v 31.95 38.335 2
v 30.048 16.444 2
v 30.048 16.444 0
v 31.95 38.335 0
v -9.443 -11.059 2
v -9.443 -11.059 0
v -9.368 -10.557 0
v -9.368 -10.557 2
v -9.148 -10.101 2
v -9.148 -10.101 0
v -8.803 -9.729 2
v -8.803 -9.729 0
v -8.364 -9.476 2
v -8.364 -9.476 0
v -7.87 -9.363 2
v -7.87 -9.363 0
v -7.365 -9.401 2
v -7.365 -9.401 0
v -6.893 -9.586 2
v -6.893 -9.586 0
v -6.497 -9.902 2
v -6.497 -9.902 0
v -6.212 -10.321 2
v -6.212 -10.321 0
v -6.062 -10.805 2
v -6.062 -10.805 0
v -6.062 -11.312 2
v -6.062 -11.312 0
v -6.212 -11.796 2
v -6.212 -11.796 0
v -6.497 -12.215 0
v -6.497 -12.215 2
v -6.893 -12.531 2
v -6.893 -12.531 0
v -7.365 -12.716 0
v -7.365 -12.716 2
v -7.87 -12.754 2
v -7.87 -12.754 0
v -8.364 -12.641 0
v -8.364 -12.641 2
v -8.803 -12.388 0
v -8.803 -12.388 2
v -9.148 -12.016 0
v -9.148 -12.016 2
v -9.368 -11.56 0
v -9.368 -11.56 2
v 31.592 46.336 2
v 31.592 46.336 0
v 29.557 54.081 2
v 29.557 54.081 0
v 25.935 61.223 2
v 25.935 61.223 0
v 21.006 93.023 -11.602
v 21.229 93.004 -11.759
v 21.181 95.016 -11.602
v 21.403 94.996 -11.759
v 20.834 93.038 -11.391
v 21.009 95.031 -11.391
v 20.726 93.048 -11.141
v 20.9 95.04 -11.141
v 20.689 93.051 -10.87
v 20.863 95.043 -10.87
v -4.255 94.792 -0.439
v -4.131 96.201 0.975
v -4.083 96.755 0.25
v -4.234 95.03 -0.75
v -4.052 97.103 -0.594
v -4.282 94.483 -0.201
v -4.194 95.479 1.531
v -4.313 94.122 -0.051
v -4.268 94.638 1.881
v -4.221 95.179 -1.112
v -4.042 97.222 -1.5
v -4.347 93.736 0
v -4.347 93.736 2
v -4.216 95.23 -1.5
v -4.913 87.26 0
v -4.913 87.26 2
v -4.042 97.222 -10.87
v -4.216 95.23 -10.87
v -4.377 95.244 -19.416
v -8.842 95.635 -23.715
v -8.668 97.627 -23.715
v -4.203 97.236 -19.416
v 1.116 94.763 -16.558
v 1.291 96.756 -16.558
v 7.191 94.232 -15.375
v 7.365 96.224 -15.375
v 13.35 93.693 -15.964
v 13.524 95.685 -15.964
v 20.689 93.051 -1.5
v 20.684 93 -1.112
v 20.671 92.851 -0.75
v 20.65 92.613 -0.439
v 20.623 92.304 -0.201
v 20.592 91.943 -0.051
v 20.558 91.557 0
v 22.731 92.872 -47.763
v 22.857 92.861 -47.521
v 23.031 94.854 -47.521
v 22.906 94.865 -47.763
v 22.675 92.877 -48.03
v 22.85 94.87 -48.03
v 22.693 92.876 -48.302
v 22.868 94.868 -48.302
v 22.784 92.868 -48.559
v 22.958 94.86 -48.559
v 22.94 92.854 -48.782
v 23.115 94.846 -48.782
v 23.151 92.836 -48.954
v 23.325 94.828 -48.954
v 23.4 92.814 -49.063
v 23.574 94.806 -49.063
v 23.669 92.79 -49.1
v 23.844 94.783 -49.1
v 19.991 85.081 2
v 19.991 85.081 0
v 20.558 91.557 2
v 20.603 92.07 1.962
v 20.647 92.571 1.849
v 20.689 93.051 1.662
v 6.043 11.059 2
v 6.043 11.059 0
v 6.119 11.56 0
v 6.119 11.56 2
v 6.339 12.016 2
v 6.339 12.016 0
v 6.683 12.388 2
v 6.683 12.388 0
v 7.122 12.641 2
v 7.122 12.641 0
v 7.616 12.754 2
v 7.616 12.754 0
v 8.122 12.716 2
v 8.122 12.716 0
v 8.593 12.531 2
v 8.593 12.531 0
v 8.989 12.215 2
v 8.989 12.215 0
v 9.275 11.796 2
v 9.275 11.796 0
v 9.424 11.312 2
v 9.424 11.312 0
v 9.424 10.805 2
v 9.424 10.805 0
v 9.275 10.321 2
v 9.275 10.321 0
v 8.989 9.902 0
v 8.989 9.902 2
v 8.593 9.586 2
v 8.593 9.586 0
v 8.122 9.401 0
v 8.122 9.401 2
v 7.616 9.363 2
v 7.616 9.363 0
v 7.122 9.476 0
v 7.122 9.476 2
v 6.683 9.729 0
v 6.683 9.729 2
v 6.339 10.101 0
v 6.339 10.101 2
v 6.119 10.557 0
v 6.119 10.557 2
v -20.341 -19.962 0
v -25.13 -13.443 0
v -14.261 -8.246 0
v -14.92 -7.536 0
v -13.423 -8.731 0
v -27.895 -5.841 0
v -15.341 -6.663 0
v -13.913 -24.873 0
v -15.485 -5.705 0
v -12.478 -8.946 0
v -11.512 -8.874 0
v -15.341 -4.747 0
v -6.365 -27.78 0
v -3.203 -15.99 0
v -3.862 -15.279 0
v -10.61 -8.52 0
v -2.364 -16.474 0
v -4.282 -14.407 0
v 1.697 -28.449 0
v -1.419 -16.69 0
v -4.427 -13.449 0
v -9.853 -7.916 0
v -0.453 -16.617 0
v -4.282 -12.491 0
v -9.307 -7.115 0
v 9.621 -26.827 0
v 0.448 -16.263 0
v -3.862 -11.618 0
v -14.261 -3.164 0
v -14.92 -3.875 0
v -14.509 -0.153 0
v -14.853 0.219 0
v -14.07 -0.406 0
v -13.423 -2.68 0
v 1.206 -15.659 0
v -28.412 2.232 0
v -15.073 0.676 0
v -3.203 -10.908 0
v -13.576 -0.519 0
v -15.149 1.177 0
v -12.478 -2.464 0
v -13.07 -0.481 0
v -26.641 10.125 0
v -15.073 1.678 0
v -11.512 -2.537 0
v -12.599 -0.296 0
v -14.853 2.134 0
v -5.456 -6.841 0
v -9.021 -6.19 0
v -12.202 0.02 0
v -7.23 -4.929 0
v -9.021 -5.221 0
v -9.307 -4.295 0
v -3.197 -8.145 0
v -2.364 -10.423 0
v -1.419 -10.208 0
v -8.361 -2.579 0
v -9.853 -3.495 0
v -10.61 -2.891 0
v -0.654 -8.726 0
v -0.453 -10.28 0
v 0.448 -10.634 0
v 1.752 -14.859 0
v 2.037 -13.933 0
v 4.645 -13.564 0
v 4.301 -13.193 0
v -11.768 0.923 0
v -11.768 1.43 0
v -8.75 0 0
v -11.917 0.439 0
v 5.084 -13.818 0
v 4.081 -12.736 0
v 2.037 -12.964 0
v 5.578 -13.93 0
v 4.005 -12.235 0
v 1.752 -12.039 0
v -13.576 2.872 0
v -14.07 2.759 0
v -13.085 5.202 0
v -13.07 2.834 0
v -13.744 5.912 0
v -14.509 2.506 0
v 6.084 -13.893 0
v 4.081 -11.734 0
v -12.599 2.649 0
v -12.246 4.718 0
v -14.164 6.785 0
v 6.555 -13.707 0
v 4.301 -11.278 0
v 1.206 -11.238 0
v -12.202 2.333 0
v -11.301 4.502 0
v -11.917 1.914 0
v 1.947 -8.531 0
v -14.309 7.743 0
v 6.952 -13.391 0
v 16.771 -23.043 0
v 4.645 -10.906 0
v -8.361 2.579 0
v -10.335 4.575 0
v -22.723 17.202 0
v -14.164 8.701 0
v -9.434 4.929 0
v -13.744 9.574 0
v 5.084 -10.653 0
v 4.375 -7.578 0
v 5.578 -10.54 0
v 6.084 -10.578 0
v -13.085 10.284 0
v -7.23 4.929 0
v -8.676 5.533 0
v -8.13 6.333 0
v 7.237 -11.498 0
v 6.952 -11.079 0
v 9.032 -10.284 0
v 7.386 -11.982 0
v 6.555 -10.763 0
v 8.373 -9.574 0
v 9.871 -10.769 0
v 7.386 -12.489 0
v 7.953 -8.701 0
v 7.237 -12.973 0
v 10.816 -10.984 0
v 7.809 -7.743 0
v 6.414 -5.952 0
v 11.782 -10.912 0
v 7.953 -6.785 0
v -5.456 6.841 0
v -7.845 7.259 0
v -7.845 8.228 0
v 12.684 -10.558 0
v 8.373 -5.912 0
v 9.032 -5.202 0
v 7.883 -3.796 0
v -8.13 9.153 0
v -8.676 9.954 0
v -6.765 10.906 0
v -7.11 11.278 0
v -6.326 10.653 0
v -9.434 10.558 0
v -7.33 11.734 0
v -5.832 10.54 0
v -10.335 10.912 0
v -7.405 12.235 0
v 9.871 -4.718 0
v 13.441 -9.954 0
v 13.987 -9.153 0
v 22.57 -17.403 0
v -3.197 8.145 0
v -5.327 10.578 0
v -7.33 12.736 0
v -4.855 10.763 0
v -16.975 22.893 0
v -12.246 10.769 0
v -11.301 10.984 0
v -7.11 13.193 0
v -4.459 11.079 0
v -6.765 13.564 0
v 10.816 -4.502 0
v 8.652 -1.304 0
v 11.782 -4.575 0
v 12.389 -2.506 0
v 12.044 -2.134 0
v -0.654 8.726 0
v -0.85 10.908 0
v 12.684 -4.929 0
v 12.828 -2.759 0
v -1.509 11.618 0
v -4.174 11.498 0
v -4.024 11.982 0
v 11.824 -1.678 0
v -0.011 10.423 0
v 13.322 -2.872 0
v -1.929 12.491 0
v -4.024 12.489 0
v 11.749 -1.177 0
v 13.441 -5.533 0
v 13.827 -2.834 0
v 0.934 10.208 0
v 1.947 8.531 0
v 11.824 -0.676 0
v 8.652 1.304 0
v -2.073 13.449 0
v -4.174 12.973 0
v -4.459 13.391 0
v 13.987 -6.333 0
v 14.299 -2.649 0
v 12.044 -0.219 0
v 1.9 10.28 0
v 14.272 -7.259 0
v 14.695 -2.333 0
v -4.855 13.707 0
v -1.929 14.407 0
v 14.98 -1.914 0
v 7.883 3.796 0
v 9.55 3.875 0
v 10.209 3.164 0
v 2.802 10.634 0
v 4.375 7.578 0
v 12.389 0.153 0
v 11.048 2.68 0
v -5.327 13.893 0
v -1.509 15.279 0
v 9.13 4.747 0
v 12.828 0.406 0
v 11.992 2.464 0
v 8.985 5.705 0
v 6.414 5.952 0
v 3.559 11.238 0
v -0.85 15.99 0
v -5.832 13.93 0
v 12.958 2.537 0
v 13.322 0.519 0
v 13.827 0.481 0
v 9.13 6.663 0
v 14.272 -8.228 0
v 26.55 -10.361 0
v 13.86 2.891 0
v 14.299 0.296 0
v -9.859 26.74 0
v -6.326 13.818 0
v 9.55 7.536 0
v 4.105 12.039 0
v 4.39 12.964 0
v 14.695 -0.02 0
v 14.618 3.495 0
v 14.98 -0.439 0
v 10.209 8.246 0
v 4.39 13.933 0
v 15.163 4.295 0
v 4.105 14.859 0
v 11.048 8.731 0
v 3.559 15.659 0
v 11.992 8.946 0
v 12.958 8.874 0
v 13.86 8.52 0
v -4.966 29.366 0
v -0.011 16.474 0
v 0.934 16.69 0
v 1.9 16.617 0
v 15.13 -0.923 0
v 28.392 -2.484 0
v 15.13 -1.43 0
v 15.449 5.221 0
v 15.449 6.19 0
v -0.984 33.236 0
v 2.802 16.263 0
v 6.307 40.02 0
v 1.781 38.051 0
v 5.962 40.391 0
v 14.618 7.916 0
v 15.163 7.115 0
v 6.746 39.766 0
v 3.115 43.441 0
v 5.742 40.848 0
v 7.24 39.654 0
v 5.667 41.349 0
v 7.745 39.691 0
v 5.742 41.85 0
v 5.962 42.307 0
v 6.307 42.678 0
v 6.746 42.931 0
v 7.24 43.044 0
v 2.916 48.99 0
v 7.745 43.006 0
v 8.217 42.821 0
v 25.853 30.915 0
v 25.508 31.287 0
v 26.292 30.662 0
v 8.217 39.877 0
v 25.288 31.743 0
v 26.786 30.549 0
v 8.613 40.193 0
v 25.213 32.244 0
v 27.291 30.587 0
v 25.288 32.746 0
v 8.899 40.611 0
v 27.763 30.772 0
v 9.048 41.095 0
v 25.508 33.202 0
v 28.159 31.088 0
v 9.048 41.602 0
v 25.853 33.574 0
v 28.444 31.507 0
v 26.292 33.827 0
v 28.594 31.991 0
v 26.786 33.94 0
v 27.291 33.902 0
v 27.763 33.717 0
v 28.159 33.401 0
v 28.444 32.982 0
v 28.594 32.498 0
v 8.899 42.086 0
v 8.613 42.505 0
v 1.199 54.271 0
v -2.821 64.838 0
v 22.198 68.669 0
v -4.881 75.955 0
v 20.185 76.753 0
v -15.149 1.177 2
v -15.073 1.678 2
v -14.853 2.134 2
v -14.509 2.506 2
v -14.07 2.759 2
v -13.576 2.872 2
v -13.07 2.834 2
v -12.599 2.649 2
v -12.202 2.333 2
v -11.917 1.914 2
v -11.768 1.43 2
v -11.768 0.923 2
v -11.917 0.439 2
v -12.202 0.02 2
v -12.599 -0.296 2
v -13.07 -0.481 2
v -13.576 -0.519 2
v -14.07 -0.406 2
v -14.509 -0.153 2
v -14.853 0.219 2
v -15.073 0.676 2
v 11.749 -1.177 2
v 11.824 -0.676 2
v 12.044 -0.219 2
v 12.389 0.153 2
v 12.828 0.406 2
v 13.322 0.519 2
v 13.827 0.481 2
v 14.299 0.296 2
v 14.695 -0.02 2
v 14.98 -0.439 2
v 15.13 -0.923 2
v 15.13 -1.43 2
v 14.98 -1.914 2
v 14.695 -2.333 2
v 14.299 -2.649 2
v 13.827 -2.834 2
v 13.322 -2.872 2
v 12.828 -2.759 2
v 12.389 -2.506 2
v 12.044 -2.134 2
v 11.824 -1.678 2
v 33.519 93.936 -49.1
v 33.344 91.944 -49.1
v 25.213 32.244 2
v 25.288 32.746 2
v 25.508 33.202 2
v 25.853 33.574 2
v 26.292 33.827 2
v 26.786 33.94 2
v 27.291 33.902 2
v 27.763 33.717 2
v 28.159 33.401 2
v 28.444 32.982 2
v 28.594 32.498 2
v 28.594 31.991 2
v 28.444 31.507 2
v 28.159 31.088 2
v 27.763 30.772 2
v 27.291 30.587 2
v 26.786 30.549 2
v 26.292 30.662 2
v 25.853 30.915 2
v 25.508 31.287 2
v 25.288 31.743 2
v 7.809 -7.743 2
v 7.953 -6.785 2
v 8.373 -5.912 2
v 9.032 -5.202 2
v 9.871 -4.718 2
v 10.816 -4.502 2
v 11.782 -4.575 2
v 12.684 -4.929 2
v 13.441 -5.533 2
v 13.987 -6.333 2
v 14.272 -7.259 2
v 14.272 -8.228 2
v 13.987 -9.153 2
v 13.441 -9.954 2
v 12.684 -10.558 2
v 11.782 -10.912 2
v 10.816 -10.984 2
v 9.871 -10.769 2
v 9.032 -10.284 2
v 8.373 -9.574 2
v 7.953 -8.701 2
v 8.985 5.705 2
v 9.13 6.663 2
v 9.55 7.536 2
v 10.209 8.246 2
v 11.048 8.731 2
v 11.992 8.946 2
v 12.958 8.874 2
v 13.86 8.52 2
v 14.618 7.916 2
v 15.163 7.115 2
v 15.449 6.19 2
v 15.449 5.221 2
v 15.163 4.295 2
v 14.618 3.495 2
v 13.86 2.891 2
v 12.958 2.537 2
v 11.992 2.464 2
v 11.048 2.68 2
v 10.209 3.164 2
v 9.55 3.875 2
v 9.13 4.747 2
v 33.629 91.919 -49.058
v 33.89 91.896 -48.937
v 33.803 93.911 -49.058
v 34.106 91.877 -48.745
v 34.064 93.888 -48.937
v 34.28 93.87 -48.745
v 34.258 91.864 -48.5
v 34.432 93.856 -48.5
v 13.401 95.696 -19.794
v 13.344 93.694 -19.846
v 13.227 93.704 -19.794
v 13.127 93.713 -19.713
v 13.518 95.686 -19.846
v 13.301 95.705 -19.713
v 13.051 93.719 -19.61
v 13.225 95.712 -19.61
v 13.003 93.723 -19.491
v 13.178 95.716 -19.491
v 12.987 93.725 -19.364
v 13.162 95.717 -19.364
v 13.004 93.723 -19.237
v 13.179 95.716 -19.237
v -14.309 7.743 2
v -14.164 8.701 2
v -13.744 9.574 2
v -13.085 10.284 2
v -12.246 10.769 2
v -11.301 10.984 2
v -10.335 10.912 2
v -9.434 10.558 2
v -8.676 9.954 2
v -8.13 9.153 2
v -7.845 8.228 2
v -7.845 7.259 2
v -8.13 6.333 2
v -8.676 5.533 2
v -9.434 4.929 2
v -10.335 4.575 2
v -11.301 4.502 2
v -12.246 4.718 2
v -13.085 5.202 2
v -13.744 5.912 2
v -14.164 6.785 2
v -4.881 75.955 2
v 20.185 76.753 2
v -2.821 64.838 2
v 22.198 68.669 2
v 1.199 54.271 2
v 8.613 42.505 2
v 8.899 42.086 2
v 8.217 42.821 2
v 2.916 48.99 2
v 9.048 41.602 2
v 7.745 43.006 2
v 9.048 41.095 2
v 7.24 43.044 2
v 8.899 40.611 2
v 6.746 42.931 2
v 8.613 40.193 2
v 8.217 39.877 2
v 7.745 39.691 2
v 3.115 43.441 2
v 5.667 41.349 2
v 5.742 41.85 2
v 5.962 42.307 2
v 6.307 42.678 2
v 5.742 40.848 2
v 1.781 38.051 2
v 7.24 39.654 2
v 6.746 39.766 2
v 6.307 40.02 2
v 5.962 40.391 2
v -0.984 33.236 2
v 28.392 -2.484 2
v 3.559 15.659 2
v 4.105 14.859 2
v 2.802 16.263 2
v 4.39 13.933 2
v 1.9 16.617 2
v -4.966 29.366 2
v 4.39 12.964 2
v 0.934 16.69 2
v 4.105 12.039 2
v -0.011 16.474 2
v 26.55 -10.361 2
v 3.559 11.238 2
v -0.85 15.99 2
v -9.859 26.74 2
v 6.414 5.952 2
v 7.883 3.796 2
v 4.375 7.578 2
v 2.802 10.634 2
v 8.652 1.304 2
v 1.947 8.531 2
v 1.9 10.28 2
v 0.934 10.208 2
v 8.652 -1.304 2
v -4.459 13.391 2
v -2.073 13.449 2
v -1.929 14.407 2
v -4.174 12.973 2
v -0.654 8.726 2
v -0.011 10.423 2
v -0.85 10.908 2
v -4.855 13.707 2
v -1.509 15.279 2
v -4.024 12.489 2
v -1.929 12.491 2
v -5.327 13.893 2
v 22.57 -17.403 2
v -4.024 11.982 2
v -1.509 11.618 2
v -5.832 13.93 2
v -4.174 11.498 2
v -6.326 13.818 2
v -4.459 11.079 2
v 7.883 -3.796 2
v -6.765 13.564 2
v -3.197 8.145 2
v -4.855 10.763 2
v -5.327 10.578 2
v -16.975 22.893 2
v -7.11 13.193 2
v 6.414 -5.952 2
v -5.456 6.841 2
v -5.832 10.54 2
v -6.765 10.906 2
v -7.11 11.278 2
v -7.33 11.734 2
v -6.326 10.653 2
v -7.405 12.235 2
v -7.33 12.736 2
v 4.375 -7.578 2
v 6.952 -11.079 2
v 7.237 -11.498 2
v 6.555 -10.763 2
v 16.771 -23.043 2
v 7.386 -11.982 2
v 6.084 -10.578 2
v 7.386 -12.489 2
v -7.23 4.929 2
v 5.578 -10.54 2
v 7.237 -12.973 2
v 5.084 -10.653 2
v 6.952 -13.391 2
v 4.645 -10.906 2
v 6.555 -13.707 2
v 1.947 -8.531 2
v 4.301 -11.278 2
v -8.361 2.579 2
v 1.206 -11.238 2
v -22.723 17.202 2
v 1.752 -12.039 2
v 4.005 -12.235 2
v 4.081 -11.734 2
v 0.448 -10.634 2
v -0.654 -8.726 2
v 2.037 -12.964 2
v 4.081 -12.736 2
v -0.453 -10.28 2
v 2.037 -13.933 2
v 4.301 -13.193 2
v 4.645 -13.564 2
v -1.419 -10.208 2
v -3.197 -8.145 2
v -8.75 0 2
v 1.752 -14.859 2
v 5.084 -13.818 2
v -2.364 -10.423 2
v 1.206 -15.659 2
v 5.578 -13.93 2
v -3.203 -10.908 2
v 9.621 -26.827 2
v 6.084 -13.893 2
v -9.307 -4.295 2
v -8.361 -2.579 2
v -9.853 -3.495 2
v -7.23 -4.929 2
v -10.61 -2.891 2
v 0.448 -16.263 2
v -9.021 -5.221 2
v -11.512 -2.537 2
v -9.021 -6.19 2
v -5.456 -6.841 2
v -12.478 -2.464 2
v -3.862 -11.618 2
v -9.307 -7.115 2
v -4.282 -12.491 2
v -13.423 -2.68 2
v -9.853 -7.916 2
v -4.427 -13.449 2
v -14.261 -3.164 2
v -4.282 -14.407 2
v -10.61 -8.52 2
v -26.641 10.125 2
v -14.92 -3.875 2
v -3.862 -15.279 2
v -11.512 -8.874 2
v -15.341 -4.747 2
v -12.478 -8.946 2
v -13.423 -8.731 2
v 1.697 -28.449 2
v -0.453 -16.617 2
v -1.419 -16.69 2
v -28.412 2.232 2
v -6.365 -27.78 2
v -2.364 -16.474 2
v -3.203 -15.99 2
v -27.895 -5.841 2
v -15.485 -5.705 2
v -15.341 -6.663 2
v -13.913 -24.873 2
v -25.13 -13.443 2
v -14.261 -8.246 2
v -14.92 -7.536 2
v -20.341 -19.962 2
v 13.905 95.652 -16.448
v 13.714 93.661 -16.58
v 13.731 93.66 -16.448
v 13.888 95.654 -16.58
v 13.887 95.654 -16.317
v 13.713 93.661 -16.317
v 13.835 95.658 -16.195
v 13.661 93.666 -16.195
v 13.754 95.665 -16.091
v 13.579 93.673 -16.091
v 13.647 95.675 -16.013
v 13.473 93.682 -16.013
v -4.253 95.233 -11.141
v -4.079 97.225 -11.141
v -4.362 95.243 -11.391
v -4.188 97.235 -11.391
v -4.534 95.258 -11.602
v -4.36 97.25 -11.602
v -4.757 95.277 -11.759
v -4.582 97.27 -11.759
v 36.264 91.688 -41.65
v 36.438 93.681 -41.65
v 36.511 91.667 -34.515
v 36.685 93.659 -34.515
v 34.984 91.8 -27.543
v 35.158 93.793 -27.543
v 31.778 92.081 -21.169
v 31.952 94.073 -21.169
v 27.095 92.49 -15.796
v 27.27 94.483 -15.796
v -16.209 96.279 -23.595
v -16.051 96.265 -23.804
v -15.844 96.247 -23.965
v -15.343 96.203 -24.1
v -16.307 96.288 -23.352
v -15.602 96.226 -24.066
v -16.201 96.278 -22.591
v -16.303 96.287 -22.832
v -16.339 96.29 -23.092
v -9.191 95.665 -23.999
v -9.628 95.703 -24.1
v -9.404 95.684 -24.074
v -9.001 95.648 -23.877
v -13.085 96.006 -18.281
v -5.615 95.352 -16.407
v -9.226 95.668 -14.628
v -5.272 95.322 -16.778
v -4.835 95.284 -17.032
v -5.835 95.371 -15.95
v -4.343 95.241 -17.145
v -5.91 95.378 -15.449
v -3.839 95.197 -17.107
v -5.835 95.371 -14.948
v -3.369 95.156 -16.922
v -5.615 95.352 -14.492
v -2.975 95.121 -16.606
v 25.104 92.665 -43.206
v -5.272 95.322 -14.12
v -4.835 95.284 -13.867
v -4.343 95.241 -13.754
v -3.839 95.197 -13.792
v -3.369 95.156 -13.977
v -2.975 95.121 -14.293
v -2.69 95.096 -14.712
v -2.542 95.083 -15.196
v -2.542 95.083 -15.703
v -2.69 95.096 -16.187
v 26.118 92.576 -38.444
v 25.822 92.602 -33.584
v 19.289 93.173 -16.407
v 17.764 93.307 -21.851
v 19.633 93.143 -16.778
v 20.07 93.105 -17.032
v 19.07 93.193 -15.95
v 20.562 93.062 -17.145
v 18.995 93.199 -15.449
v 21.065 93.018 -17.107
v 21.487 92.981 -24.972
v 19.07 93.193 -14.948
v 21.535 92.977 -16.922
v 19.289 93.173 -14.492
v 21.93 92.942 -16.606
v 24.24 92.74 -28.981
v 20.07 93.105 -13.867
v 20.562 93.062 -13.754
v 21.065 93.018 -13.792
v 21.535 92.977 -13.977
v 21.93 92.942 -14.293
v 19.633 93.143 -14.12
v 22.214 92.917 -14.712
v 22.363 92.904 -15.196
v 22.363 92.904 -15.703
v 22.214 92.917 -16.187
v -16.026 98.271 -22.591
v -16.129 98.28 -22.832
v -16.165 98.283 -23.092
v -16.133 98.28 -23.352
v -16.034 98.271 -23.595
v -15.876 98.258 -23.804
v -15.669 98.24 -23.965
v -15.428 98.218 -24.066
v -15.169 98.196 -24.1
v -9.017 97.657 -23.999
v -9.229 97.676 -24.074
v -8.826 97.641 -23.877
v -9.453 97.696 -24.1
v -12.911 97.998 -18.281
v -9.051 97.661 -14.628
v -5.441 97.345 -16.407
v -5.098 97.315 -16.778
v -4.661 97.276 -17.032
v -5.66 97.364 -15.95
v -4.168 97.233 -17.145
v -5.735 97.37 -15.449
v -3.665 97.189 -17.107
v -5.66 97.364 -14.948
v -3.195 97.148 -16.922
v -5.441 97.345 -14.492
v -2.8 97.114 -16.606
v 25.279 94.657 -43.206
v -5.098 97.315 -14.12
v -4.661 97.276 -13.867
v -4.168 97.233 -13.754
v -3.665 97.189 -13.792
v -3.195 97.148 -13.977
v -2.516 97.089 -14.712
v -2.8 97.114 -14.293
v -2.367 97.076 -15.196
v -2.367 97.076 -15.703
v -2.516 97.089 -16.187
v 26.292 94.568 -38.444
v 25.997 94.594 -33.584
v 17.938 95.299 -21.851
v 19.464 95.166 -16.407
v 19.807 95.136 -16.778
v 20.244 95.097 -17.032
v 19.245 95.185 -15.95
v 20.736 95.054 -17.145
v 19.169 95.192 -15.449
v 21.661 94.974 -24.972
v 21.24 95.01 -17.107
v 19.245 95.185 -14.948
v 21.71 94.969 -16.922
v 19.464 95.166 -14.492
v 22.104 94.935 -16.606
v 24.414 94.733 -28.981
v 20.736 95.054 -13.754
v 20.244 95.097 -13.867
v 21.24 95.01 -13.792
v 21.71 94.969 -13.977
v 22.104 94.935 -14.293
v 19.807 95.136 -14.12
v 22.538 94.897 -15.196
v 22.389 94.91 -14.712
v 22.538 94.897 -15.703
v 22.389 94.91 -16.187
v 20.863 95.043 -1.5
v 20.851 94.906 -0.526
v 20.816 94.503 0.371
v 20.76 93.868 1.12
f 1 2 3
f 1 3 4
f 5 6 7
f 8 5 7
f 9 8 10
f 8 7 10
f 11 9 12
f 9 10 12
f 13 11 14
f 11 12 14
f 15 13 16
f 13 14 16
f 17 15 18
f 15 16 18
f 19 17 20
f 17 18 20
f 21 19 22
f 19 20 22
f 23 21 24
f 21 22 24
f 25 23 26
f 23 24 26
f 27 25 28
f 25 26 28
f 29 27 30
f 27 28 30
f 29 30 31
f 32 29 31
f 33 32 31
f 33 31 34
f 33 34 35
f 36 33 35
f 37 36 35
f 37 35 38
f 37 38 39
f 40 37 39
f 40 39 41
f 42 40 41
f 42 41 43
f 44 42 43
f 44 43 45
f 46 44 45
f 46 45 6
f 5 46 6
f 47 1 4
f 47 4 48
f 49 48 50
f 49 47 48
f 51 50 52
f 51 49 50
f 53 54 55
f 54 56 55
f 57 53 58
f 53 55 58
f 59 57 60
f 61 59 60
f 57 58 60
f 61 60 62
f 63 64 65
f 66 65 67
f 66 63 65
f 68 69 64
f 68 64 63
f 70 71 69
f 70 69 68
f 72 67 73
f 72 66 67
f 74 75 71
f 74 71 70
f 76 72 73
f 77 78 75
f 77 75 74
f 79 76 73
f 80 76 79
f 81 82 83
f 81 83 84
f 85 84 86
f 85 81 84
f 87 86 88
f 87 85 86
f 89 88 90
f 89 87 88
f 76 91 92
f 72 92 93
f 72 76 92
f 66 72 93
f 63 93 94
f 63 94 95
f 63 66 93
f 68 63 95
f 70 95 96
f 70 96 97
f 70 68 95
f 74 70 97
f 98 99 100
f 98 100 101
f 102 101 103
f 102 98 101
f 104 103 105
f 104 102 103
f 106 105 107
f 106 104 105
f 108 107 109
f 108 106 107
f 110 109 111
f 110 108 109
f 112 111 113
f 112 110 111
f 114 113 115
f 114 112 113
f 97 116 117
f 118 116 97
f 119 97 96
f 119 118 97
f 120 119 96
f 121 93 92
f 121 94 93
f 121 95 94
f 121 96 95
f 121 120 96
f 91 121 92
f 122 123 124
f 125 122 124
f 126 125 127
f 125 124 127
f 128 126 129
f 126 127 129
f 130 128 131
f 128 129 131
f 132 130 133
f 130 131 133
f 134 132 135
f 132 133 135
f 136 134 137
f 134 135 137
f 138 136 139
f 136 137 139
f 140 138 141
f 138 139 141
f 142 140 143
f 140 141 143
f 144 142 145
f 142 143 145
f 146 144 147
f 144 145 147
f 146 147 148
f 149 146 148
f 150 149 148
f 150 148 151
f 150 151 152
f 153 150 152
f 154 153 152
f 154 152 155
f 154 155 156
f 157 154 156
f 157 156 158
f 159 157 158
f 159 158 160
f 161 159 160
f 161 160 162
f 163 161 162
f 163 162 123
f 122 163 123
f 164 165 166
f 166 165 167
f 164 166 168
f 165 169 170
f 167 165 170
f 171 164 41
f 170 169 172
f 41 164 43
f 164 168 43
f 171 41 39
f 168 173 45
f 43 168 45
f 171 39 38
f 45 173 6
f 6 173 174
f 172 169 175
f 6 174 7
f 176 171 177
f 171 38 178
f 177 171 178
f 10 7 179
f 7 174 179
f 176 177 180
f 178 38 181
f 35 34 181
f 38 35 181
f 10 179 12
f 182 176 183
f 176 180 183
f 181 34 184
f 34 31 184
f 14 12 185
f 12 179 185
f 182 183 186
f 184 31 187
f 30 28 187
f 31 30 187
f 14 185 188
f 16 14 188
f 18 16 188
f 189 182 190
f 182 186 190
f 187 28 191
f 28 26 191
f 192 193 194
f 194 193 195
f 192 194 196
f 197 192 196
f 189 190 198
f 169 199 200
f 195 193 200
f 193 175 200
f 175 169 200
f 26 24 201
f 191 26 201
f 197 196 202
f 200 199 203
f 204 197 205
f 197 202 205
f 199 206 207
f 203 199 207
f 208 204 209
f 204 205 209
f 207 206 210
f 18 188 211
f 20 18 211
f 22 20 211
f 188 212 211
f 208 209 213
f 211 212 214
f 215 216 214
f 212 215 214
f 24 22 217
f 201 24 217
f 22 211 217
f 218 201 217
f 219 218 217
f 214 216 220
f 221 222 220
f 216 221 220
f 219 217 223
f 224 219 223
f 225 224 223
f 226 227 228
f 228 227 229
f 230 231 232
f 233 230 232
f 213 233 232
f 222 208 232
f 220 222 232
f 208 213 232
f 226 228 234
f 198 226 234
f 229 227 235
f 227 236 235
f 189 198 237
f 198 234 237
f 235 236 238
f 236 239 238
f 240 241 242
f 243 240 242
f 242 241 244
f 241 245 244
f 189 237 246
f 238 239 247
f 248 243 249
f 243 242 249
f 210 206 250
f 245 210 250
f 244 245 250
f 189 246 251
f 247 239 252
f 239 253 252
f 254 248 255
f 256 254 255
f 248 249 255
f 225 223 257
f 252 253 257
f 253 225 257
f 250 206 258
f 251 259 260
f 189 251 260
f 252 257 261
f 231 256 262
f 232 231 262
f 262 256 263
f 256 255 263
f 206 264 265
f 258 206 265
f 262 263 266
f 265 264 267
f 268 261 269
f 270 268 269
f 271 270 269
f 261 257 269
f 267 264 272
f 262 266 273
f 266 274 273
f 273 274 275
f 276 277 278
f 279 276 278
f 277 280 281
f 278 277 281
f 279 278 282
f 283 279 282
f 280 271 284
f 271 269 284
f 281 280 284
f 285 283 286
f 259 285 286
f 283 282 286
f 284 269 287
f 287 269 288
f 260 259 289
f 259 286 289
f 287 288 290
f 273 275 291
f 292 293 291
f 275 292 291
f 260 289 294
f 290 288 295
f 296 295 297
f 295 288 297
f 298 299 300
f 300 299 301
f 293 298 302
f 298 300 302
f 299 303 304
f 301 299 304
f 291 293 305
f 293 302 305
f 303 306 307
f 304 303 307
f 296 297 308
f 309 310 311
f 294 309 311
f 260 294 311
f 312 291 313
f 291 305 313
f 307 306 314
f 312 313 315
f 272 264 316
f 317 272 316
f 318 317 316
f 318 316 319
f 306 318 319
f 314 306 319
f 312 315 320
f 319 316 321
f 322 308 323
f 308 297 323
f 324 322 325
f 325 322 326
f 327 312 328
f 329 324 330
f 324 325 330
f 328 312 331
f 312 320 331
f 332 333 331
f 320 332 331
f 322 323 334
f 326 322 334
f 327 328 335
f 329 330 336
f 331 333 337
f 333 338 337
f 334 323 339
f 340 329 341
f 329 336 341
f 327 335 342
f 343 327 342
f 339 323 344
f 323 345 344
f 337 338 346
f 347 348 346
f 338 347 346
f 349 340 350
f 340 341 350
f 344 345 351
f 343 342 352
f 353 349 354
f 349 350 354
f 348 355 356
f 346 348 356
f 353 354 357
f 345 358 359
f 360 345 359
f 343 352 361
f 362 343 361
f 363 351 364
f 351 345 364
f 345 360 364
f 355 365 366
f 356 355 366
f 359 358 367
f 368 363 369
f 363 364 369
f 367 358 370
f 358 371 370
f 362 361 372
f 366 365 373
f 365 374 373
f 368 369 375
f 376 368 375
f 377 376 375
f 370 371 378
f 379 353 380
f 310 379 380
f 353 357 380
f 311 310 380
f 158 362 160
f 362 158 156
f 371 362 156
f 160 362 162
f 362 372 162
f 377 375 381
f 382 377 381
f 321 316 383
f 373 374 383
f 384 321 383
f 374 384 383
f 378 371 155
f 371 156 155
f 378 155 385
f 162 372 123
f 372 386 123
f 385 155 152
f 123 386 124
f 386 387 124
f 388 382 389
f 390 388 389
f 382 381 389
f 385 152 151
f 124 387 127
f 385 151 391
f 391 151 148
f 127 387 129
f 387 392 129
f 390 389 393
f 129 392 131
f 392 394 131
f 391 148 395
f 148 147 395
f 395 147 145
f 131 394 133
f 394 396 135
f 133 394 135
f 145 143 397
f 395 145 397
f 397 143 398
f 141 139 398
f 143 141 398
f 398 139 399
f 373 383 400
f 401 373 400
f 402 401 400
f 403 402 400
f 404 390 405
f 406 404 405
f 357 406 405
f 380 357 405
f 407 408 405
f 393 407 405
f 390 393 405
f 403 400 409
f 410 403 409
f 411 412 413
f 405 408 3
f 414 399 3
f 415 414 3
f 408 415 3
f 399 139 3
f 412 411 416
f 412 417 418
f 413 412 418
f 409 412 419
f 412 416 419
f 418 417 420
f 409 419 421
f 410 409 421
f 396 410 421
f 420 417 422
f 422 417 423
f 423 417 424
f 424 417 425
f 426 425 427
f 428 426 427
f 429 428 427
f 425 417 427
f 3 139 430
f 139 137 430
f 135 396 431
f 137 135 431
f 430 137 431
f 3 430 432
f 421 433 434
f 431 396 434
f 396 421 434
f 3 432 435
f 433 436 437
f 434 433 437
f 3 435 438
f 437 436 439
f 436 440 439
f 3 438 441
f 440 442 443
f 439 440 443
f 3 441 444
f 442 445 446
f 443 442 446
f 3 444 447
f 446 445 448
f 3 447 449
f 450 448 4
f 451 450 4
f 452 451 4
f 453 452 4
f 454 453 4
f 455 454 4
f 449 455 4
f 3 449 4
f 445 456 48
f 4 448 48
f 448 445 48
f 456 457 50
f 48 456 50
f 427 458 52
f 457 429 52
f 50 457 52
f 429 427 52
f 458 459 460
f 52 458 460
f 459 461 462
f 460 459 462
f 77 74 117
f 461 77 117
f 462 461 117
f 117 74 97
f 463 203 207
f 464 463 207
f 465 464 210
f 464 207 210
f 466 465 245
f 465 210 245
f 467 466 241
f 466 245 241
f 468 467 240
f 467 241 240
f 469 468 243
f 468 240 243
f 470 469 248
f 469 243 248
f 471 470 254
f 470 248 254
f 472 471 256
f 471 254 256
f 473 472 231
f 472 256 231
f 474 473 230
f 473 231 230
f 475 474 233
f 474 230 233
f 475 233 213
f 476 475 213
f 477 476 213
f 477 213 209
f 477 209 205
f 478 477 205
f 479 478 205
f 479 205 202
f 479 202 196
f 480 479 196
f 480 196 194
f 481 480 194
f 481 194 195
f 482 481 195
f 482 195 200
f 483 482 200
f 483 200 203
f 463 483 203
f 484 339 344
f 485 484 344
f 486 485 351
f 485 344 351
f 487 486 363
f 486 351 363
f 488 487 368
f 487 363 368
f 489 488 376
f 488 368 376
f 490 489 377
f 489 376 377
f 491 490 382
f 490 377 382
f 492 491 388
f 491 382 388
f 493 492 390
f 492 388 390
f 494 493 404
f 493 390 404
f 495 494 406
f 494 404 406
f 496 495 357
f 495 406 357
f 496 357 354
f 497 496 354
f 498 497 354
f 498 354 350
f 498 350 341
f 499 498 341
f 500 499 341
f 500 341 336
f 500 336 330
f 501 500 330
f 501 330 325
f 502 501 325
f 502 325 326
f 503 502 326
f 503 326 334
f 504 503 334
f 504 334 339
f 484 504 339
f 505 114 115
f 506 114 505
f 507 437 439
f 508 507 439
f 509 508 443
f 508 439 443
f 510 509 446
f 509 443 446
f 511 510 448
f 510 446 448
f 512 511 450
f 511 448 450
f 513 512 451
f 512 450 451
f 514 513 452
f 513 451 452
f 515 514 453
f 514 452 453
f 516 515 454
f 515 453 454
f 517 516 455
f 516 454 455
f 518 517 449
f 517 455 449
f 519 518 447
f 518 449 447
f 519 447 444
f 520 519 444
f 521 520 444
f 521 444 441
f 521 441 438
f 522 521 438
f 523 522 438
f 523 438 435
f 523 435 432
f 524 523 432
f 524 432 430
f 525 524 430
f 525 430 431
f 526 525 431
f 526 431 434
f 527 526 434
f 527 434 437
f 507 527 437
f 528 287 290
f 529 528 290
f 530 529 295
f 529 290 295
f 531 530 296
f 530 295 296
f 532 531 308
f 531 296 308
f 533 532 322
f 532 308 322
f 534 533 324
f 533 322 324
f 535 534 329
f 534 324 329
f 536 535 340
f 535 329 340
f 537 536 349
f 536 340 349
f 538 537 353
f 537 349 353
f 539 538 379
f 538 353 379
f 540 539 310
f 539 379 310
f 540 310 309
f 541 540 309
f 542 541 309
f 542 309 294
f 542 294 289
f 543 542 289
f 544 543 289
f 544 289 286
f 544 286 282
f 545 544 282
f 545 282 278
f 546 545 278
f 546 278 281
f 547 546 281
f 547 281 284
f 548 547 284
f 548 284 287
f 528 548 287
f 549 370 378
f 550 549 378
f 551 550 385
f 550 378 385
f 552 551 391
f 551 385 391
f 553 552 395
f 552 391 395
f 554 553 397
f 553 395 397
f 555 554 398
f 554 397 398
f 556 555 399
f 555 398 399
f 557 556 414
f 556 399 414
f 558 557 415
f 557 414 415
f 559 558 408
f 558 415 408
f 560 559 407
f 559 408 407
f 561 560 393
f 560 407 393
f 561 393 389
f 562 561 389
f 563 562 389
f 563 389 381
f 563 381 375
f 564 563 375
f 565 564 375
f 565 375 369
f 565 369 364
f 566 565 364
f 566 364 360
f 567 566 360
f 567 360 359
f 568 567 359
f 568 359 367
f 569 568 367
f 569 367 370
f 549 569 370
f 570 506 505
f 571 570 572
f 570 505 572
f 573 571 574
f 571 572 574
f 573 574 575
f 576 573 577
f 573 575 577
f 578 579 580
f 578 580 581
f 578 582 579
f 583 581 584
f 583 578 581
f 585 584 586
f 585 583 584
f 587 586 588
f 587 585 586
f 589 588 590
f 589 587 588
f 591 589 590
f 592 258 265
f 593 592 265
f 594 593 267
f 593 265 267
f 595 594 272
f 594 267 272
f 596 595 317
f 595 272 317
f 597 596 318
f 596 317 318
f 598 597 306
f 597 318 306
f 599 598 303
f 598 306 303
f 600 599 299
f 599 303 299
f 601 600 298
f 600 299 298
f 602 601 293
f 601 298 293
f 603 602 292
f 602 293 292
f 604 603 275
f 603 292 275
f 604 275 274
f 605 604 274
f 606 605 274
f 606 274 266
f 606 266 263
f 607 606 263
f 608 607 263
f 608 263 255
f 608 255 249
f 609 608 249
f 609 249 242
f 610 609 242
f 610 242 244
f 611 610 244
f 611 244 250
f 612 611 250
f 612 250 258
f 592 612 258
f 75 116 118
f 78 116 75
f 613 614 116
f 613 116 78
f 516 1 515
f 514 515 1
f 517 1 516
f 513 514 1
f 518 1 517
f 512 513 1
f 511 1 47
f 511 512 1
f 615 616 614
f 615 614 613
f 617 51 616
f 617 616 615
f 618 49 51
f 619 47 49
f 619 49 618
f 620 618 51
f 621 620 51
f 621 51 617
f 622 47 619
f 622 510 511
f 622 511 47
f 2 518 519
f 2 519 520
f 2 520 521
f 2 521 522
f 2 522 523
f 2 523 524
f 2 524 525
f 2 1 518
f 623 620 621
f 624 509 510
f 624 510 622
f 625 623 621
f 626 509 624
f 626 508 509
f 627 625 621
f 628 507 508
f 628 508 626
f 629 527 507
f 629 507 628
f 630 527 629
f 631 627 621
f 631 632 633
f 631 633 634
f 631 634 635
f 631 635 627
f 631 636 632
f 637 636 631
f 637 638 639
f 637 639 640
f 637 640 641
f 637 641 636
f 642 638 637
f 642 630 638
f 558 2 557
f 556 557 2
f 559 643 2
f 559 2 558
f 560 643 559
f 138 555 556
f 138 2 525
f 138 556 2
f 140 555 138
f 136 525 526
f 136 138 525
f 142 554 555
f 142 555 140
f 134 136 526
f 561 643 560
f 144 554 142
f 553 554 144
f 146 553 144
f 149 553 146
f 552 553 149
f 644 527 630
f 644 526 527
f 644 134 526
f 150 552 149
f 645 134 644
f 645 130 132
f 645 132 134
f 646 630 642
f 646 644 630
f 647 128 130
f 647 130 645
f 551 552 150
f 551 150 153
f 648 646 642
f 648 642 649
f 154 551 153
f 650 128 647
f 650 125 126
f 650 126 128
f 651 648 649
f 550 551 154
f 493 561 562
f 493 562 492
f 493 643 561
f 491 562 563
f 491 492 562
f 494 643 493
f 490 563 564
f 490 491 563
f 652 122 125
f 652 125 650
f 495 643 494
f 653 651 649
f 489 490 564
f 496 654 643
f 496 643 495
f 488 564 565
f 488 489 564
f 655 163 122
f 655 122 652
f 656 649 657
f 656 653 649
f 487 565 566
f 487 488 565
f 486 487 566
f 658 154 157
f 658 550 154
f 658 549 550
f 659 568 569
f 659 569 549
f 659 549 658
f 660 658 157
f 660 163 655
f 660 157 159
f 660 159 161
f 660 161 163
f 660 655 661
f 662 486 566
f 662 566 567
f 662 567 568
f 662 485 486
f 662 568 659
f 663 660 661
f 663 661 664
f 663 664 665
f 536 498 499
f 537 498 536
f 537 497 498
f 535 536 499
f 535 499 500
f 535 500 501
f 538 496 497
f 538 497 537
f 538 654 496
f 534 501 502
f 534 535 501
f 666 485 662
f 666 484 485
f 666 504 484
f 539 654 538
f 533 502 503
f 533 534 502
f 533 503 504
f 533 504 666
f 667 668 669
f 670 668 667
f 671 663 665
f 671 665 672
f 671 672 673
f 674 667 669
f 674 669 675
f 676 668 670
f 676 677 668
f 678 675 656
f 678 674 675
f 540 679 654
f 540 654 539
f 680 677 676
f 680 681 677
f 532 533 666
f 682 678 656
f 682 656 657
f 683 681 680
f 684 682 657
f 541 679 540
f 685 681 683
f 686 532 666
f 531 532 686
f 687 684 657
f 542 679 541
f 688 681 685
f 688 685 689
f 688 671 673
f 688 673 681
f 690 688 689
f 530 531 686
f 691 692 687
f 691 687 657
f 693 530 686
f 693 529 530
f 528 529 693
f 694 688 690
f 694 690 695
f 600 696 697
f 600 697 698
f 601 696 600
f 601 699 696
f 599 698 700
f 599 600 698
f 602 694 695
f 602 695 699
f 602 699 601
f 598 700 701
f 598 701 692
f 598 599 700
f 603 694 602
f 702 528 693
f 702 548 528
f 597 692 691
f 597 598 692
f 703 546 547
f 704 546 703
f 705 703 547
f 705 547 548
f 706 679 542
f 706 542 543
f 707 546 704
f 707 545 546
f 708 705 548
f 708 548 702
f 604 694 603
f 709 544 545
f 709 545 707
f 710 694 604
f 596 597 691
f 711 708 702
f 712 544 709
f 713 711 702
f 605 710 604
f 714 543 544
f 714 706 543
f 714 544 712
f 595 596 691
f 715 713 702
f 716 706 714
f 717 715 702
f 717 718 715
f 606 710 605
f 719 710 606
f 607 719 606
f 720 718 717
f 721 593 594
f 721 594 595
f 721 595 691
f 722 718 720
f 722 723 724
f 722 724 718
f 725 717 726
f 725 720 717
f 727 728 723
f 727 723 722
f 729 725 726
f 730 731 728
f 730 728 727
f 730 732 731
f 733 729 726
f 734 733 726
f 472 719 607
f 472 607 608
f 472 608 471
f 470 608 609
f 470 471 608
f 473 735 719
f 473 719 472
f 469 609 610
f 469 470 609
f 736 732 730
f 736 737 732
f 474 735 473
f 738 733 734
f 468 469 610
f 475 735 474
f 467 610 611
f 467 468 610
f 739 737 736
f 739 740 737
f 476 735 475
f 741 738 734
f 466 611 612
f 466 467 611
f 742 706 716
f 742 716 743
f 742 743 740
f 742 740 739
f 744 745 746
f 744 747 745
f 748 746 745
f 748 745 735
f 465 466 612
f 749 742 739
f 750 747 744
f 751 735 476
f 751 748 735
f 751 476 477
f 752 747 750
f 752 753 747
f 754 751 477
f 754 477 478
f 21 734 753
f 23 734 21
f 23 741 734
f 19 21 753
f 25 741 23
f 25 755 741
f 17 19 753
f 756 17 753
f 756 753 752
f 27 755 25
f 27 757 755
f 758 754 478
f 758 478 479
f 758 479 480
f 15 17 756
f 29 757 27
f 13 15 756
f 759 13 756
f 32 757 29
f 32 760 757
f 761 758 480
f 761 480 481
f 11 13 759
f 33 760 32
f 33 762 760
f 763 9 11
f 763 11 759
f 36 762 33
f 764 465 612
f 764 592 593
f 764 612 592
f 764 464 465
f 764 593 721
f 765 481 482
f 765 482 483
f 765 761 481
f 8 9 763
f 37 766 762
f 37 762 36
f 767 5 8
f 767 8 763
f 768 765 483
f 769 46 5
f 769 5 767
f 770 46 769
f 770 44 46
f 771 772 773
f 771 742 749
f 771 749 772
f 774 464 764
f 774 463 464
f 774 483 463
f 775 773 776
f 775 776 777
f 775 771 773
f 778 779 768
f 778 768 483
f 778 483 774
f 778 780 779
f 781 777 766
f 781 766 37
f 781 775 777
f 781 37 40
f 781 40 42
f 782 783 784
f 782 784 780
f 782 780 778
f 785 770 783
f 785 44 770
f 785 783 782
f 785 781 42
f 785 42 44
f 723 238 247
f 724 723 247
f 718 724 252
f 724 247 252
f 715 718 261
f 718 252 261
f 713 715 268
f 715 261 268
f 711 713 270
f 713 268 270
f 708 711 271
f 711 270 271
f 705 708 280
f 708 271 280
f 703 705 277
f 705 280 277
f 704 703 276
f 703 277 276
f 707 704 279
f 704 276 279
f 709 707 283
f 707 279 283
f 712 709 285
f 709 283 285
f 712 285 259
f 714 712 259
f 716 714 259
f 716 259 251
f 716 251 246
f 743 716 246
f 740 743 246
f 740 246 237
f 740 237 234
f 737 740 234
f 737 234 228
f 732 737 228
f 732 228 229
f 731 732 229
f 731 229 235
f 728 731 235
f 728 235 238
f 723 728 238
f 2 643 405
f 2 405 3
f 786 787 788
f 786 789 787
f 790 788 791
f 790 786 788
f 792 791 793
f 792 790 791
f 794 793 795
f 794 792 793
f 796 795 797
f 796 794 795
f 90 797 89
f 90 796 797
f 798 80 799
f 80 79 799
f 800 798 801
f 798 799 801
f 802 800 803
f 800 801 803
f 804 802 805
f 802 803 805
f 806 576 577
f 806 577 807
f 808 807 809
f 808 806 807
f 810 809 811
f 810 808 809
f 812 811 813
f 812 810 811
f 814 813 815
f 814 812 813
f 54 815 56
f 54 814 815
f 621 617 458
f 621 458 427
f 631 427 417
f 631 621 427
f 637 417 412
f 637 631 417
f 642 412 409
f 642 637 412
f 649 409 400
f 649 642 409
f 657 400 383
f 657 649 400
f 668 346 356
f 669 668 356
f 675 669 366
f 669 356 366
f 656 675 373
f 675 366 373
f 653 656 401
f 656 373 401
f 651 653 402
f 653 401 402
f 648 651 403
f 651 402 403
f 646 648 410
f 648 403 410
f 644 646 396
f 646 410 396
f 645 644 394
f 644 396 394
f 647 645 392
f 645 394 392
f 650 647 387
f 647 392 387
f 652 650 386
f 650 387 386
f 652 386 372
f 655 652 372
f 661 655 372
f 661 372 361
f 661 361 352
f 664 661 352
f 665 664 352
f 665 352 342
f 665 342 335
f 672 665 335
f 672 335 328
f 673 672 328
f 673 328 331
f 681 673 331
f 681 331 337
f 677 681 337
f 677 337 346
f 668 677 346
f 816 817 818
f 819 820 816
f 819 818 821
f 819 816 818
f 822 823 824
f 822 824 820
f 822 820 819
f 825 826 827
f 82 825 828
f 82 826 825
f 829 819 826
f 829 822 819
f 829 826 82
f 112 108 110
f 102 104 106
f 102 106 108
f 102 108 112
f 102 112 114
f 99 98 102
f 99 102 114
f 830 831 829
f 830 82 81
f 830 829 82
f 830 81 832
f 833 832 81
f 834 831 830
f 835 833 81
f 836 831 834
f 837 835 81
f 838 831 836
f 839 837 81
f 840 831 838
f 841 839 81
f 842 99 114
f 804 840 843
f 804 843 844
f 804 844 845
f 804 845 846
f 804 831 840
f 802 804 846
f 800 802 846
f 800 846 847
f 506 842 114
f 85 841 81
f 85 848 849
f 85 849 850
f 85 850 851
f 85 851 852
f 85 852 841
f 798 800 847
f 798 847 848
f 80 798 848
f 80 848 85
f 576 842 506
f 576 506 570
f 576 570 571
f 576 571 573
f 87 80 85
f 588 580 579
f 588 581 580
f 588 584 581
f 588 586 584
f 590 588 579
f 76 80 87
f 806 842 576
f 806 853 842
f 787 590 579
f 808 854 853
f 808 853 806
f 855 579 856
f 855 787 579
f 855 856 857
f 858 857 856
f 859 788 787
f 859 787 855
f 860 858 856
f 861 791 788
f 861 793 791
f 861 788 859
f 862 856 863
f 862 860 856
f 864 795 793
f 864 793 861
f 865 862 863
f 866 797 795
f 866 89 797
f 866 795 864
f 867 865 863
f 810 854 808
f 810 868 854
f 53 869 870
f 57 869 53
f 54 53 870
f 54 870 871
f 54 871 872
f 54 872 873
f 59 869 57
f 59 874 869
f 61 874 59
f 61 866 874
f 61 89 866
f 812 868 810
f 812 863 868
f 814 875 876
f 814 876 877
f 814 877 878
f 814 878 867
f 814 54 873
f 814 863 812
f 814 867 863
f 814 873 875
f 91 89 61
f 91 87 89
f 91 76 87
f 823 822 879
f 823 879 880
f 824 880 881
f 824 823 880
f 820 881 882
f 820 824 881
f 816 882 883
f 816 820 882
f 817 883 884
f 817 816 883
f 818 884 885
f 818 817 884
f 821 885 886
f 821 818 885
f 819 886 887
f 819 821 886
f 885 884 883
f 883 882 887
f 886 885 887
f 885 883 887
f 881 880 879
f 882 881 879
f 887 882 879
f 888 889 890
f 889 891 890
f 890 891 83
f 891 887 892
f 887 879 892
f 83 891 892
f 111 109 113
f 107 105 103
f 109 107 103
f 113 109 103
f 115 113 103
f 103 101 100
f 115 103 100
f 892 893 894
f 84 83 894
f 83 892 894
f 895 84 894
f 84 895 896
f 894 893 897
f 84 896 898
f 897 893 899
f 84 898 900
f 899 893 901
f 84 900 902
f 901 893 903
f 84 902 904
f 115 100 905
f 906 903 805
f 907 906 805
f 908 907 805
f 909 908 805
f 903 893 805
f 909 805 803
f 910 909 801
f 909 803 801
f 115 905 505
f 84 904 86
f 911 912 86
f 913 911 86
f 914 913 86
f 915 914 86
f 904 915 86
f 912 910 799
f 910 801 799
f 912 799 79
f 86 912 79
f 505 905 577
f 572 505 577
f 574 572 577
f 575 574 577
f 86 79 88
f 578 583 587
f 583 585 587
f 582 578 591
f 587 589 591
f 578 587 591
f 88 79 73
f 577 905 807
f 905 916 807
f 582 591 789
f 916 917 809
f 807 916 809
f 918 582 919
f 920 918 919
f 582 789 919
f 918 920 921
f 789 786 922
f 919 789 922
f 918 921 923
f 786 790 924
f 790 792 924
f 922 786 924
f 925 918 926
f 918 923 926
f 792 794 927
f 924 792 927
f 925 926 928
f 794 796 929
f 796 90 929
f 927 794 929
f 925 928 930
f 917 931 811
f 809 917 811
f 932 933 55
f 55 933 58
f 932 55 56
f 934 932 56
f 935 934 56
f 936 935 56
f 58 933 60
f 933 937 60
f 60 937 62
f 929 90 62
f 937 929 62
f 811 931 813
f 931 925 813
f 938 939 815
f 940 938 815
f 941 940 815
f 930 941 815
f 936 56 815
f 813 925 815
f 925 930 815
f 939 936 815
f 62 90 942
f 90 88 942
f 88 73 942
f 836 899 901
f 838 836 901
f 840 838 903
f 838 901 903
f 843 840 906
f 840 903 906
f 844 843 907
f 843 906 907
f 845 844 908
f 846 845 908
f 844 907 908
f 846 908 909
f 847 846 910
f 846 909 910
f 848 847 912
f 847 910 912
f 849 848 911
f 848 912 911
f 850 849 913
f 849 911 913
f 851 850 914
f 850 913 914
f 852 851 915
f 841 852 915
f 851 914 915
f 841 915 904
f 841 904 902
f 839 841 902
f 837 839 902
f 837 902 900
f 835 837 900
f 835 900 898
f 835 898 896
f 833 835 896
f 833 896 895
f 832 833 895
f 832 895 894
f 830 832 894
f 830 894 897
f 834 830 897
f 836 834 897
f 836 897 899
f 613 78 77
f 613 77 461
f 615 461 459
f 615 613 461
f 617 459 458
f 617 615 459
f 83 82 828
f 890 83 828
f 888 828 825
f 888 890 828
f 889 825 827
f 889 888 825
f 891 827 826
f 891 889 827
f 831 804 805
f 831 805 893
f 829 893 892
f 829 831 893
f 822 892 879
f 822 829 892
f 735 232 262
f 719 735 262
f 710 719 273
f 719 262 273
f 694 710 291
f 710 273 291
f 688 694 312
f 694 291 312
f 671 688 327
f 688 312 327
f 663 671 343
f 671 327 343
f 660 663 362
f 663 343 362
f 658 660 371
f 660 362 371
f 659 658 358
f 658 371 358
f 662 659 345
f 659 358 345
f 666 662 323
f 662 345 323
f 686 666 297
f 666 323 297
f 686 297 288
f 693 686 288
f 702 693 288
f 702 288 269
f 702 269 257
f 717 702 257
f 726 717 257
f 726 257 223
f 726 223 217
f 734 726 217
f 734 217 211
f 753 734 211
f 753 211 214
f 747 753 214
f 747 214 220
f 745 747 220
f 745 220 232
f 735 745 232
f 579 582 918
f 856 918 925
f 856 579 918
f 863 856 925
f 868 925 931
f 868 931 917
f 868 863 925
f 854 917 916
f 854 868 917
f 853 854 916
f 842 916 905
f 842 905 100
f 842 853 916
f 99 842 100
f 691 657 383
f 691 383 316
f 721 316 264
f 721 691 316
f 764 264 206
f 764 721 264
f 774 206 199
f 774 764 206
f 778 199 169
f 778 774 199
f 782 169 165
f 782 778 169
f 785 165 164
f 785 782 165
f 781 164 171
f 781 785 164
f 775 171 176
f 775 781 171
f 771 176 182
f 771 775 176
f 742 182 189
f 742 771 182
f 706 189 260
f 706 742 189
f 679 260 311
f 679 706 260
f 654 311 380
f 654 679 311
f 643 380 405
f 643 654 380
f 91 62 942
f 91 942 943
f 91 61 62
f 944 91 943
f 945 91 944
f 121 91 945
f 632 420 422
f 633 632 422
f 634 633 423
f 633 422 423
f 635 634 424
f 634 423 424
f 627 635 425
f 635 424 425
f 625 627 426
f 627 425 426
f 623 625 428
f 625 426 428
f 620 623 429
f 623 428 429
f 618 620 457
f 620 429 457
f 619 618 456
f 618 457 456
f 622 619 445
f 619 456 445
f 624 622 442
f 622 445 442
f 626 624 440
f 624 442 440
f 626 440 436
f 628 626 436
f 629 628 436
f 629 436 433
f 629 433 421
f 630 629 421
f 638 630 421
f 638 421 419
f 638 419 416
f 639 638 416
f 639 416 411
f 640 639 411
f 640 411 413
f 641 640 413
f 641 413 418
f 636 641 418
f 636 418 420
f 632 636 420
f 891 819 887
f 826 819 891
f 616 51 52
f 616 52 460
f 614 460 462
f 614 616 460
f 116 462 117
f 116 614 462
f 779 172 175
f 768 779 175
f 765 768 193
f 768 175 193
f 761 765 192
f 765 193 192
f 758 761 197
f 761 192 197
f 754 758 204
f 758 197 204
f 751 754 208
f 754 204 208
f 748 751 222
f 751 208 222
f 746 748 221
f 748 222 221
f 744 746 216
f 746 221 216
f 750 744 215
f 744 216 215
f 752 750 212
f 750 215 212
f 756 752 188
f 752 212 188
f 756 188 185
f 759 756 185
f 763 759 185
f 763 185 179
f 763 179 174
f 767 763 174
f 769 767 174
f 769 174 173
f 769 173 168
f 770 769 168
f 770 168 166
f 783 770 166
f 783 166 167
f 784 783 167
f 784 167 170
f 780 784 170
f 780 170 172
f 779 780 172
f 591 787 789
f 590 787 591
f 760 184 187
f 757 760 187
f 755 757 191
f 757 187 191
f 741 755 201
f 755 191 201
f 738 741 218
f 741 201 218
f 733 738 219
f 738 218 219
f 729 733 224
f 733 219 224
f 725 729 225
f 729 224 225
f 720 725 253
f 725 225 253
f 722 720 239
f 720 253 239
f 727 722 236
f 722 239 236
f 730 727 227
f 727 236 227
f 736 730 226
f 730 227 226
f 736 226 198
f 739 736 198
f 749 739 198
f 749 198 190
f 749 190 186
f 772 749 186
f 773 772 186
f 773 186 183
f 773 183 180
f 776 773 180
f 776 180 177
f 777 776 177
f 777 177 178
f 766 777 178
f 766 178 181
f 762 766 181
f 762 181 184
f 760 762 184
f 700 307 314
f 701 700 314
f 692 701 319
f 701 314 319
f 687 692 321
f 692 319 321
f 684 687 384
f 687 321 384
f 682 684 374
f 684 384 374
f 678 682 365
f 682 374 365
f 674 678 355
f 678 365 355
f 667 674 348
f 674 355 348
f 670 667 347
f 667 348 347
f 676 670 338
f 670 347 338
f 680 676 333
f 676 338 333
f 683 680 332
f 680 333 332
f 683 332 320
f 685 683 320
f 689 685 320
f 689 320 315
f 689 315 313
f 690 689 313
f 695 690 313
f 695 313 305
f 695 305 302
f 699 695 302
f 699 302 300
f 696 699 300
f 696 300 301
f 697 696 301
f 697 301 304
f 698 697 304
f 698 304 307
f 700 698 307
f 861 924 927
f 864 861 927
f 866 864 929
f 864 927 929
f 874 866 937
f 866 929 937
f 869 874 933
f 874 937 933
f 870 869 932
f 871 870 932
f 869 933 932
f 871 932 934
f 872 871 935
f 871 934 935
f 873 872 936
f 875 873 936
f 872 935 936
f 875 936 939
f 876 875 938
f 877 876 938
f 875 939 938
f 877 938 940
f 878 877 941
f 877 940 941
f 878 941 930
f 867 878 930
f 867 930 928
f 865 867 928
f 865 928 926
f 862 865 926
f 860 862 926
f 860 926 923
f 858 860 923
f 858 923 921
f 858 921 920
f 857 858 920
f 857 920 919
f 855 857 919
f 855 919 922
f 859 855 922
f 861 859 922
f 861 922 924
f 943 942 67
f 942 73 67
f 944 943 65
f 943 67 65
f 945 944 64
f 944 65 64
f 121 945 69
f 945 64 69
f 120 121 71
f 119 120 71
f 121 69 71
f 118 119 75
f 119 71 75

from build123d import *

# Parameters (mm, degrees)
EXTRUDE_1_DEPTH               = 2
EXTRUDE_2_DEPTH               = 2
HOLE_WIZARD_6_5_6_5_1_D       = 6.5
HOLE_WIZARD_6_5_6_5_1_DEPTH   = 51.1
HOLE_WIZARD_3_4_3_4_1_D       = 3.4
HOLE_WIZARD_3_4_3_4_1_DEPTH   = 51.1
HOLE_WIZARD_17_5_17_5_1_D     = 17.5
HOLE_WIZARD_17_5_17_5_1_DEPTH = 51.1
HOLE_WIZARD_3_4_3_4_2_D       = 3.4
HOLE_WIZARD_3_4_3_4_2_DEPTH   = 6.616402139
FILLET_1_R                    = 0.5
FILLET_2_R                    = 1
FILLET_3_R                    = 1.5
FILLET_4_R                    = 3.5


with BuildPart() as part:
    # 草图1 → 凸台-拉伸1 (new body)
    with BuildSketch(Plane.XY.offset(2)):
        with BuildLine():
            Line((19.991405474, 85.081394601), (20.688651416, 93.050952185))
            Line((20.688651416, 93.050952185), (-4.216216036, 95.229845754))
            Line((-4.216216036, 95.229845754), (-4.913461978, 87.260288169))
            ThreePointArc((-4.913461978, 87.260288169), (-4.101645556, 70.349808931), (1.198916656, 54.271021844))
            ThreePointArc((1.198916656, 54.271021844), (1.780962088, 38.051078797), (-9.859178165, 26.740355381))
            ThreePointArc((-9.859178165, 26.740355381), (-17.30251519, -22.646698835), (28.391548896, -2.483938668))
            Line((28.391548896, -2.483938668), (30.047508008, 16.443760595))
            Line((30.047508008, 16.443760595), (31.950173771, 38.33545379))
            ThreePointArc((31.950173771, 38.33545379), (30.780358309, 50.262124766), (25.93459204, 61.222621928))
            ThreePointArc((25.93459204, 61.222621928), (20.968028554, 72.655064005), (19.991405474, 85.081394601))
        make_face()
    extrude(amount=-EXTRUDE_1_DEPTH)

    # 草图2 → 凸台-拉伸2 (add)
    with BuildSketch(Plane(origin=(8.23621769, 94.14039897, 0), x_dir=(-0.9961946980917458, 0.08715574274765517, 0), z_dir=(0.08715574274765517, 0.9961946980917458, 0))):
        with BuildLine():
            Line((-15.491933385, -49.1), (-25.850531909, -49.1))
            ThreePointArc((-25.850531909, -49.1), (-26.858253967, -27.566679809), (-12.5, -11.48750305))
            Line((-12.5, -11.48750305), (-12.5, 2))
            Line((-12.5, 2), (12.5, 2))
            Line((12.5, 2), (12.5, -11.48750305))
            ThreePointArc((12.5, -11.48750305), (19.329574132, -16.156801489), (24.530313512, -22.590909091))
            ThreePointArc((24.530313512, -22.590909091), (24.538246516, -23.595433694), (23.669600757, -24.1))
            Line((23.669600757, -24.1), (17.437387992, -24.1))
            ThreePointArc((17.437387992, -24.1), (7.133948284, -16.553241572), (-5.629314231, -16.091113278))
            Line((-5.629314231, -16.091113278), (-4.658742812, -19.713335127))
            ThreePointArc((-4.658742812, -19.713335127), (-16.934605215, -30.999250357), (-14.67656847, -47.521052632))
            ThreePointArc((-14.67656847, -47.521052632), (-14.603410068, -48.558831468), (-15.491933385, -49.1))
        make_face()
    extrude(amount=EXTRUDE_2_DEPTH)

    # Ø6.5 (6.5) 直径孔1
    with Locations(Plane.XY.offset(2)):
        with Locations((11.058552598, -7.743281891), (1.176602527, 13.448628424), (-12.235155125, -5.705346533), (-11.058552598, 7.743281891), (12.235155125, 5.705346533), (-1.176602527, -13.448628424)):
            Hole(HOLE_WIZARD_6_5_6_5_1_D / 2, depth=HOLE_WIZARD_6_5_6_5_1_DEPTH)

    # Ø3.4 (3.4) 直径孔1
    with Locations(Plane.XY.offset(2)):
        with Locations((13.448628424, -1.176602527), (-5.705346533, 12.235155125), (-7.743281891, -11.058552598), (-13.448628424, 1.176602527), (7.743281891, 11.058552598), (5.705346534, -12.235155125), (26.9127025, 32.244479282), (7.366918218, 41.348863539)):
            Hole(HOLE_WIZARD_3_4_3_4_1_D / 2, depth=HOLE_WIZARD_3_4_3_4_1_DEPTH)

    # Ø17.5 (17.5) 直径孔1
    with Locations(Plane.XY.offset(2)):
        with Locations((0, 0)):
            Hole(HOLE_WIZARD_17_5_17_5_1_D / 2, depth=HOLE_WIZARD_17_5_17_5_1_DEPTH)

    # Ø3.4 (3.4) 直径孔2
    with Locations(Plane(origin=(8.23621769, 94.14039897, 0), x_dir=(0.9961946980917458, -0.08715574274765517, 0), z_dir=(-0.08715574274765517, -0.9961946980917458, 0))):
        with Locations((-25, 37.1), (-12.5, -15.449364905), (12.5, -15.449364905)):
            Hole(HOLE_WIZARD_3_4_3_4_2_D / 2, depth=HOLE_WIZARD_3_4_3_4_2_DEPTH)

    # 圆角1
    fillet_1_edges = [part.edges().sort_by_distance(p)[0] for p in [
        (12.964388321, 94.730557478, -19.713335127),
        (13.931266423, 94.645966605, -16.091113278),
    ]]
    fillet(fillet_1_edges, radius=FILLET_1_R)

    # 圆角2
    fillet_2_edges = [part.edges().sort_by_distance(p)[0] for p in [
        (-9.047660034, 96.65636217, -24.1),
        (-4.129060294, 96.226040452, -11.48750305),
        (20.775807159, 94.047146883, -11.48750305),
        (34.075536263, 92.883571359, -49.1),
    ]]
    fillet(fillet_2_edges, radius=FILLET_2_R)

    # 圆角3
    fillet_3_edges = [part.edges().sort_by_distance(p)[0] for p in [
        (8.23621769, 94.14039897, 0),
    ]]
    fillet(fillet_3_edges, radius=FILLET_3_R)

    # 圆角4
    fillet_4_edges = [part.edges().sort_by_distance(p)[0] for p in [
        (8.410529175, 96.132788366, 2),
    ]]
    fillet(fillet_4_edges, radius=FILLET_4_R)


solid = part.part
